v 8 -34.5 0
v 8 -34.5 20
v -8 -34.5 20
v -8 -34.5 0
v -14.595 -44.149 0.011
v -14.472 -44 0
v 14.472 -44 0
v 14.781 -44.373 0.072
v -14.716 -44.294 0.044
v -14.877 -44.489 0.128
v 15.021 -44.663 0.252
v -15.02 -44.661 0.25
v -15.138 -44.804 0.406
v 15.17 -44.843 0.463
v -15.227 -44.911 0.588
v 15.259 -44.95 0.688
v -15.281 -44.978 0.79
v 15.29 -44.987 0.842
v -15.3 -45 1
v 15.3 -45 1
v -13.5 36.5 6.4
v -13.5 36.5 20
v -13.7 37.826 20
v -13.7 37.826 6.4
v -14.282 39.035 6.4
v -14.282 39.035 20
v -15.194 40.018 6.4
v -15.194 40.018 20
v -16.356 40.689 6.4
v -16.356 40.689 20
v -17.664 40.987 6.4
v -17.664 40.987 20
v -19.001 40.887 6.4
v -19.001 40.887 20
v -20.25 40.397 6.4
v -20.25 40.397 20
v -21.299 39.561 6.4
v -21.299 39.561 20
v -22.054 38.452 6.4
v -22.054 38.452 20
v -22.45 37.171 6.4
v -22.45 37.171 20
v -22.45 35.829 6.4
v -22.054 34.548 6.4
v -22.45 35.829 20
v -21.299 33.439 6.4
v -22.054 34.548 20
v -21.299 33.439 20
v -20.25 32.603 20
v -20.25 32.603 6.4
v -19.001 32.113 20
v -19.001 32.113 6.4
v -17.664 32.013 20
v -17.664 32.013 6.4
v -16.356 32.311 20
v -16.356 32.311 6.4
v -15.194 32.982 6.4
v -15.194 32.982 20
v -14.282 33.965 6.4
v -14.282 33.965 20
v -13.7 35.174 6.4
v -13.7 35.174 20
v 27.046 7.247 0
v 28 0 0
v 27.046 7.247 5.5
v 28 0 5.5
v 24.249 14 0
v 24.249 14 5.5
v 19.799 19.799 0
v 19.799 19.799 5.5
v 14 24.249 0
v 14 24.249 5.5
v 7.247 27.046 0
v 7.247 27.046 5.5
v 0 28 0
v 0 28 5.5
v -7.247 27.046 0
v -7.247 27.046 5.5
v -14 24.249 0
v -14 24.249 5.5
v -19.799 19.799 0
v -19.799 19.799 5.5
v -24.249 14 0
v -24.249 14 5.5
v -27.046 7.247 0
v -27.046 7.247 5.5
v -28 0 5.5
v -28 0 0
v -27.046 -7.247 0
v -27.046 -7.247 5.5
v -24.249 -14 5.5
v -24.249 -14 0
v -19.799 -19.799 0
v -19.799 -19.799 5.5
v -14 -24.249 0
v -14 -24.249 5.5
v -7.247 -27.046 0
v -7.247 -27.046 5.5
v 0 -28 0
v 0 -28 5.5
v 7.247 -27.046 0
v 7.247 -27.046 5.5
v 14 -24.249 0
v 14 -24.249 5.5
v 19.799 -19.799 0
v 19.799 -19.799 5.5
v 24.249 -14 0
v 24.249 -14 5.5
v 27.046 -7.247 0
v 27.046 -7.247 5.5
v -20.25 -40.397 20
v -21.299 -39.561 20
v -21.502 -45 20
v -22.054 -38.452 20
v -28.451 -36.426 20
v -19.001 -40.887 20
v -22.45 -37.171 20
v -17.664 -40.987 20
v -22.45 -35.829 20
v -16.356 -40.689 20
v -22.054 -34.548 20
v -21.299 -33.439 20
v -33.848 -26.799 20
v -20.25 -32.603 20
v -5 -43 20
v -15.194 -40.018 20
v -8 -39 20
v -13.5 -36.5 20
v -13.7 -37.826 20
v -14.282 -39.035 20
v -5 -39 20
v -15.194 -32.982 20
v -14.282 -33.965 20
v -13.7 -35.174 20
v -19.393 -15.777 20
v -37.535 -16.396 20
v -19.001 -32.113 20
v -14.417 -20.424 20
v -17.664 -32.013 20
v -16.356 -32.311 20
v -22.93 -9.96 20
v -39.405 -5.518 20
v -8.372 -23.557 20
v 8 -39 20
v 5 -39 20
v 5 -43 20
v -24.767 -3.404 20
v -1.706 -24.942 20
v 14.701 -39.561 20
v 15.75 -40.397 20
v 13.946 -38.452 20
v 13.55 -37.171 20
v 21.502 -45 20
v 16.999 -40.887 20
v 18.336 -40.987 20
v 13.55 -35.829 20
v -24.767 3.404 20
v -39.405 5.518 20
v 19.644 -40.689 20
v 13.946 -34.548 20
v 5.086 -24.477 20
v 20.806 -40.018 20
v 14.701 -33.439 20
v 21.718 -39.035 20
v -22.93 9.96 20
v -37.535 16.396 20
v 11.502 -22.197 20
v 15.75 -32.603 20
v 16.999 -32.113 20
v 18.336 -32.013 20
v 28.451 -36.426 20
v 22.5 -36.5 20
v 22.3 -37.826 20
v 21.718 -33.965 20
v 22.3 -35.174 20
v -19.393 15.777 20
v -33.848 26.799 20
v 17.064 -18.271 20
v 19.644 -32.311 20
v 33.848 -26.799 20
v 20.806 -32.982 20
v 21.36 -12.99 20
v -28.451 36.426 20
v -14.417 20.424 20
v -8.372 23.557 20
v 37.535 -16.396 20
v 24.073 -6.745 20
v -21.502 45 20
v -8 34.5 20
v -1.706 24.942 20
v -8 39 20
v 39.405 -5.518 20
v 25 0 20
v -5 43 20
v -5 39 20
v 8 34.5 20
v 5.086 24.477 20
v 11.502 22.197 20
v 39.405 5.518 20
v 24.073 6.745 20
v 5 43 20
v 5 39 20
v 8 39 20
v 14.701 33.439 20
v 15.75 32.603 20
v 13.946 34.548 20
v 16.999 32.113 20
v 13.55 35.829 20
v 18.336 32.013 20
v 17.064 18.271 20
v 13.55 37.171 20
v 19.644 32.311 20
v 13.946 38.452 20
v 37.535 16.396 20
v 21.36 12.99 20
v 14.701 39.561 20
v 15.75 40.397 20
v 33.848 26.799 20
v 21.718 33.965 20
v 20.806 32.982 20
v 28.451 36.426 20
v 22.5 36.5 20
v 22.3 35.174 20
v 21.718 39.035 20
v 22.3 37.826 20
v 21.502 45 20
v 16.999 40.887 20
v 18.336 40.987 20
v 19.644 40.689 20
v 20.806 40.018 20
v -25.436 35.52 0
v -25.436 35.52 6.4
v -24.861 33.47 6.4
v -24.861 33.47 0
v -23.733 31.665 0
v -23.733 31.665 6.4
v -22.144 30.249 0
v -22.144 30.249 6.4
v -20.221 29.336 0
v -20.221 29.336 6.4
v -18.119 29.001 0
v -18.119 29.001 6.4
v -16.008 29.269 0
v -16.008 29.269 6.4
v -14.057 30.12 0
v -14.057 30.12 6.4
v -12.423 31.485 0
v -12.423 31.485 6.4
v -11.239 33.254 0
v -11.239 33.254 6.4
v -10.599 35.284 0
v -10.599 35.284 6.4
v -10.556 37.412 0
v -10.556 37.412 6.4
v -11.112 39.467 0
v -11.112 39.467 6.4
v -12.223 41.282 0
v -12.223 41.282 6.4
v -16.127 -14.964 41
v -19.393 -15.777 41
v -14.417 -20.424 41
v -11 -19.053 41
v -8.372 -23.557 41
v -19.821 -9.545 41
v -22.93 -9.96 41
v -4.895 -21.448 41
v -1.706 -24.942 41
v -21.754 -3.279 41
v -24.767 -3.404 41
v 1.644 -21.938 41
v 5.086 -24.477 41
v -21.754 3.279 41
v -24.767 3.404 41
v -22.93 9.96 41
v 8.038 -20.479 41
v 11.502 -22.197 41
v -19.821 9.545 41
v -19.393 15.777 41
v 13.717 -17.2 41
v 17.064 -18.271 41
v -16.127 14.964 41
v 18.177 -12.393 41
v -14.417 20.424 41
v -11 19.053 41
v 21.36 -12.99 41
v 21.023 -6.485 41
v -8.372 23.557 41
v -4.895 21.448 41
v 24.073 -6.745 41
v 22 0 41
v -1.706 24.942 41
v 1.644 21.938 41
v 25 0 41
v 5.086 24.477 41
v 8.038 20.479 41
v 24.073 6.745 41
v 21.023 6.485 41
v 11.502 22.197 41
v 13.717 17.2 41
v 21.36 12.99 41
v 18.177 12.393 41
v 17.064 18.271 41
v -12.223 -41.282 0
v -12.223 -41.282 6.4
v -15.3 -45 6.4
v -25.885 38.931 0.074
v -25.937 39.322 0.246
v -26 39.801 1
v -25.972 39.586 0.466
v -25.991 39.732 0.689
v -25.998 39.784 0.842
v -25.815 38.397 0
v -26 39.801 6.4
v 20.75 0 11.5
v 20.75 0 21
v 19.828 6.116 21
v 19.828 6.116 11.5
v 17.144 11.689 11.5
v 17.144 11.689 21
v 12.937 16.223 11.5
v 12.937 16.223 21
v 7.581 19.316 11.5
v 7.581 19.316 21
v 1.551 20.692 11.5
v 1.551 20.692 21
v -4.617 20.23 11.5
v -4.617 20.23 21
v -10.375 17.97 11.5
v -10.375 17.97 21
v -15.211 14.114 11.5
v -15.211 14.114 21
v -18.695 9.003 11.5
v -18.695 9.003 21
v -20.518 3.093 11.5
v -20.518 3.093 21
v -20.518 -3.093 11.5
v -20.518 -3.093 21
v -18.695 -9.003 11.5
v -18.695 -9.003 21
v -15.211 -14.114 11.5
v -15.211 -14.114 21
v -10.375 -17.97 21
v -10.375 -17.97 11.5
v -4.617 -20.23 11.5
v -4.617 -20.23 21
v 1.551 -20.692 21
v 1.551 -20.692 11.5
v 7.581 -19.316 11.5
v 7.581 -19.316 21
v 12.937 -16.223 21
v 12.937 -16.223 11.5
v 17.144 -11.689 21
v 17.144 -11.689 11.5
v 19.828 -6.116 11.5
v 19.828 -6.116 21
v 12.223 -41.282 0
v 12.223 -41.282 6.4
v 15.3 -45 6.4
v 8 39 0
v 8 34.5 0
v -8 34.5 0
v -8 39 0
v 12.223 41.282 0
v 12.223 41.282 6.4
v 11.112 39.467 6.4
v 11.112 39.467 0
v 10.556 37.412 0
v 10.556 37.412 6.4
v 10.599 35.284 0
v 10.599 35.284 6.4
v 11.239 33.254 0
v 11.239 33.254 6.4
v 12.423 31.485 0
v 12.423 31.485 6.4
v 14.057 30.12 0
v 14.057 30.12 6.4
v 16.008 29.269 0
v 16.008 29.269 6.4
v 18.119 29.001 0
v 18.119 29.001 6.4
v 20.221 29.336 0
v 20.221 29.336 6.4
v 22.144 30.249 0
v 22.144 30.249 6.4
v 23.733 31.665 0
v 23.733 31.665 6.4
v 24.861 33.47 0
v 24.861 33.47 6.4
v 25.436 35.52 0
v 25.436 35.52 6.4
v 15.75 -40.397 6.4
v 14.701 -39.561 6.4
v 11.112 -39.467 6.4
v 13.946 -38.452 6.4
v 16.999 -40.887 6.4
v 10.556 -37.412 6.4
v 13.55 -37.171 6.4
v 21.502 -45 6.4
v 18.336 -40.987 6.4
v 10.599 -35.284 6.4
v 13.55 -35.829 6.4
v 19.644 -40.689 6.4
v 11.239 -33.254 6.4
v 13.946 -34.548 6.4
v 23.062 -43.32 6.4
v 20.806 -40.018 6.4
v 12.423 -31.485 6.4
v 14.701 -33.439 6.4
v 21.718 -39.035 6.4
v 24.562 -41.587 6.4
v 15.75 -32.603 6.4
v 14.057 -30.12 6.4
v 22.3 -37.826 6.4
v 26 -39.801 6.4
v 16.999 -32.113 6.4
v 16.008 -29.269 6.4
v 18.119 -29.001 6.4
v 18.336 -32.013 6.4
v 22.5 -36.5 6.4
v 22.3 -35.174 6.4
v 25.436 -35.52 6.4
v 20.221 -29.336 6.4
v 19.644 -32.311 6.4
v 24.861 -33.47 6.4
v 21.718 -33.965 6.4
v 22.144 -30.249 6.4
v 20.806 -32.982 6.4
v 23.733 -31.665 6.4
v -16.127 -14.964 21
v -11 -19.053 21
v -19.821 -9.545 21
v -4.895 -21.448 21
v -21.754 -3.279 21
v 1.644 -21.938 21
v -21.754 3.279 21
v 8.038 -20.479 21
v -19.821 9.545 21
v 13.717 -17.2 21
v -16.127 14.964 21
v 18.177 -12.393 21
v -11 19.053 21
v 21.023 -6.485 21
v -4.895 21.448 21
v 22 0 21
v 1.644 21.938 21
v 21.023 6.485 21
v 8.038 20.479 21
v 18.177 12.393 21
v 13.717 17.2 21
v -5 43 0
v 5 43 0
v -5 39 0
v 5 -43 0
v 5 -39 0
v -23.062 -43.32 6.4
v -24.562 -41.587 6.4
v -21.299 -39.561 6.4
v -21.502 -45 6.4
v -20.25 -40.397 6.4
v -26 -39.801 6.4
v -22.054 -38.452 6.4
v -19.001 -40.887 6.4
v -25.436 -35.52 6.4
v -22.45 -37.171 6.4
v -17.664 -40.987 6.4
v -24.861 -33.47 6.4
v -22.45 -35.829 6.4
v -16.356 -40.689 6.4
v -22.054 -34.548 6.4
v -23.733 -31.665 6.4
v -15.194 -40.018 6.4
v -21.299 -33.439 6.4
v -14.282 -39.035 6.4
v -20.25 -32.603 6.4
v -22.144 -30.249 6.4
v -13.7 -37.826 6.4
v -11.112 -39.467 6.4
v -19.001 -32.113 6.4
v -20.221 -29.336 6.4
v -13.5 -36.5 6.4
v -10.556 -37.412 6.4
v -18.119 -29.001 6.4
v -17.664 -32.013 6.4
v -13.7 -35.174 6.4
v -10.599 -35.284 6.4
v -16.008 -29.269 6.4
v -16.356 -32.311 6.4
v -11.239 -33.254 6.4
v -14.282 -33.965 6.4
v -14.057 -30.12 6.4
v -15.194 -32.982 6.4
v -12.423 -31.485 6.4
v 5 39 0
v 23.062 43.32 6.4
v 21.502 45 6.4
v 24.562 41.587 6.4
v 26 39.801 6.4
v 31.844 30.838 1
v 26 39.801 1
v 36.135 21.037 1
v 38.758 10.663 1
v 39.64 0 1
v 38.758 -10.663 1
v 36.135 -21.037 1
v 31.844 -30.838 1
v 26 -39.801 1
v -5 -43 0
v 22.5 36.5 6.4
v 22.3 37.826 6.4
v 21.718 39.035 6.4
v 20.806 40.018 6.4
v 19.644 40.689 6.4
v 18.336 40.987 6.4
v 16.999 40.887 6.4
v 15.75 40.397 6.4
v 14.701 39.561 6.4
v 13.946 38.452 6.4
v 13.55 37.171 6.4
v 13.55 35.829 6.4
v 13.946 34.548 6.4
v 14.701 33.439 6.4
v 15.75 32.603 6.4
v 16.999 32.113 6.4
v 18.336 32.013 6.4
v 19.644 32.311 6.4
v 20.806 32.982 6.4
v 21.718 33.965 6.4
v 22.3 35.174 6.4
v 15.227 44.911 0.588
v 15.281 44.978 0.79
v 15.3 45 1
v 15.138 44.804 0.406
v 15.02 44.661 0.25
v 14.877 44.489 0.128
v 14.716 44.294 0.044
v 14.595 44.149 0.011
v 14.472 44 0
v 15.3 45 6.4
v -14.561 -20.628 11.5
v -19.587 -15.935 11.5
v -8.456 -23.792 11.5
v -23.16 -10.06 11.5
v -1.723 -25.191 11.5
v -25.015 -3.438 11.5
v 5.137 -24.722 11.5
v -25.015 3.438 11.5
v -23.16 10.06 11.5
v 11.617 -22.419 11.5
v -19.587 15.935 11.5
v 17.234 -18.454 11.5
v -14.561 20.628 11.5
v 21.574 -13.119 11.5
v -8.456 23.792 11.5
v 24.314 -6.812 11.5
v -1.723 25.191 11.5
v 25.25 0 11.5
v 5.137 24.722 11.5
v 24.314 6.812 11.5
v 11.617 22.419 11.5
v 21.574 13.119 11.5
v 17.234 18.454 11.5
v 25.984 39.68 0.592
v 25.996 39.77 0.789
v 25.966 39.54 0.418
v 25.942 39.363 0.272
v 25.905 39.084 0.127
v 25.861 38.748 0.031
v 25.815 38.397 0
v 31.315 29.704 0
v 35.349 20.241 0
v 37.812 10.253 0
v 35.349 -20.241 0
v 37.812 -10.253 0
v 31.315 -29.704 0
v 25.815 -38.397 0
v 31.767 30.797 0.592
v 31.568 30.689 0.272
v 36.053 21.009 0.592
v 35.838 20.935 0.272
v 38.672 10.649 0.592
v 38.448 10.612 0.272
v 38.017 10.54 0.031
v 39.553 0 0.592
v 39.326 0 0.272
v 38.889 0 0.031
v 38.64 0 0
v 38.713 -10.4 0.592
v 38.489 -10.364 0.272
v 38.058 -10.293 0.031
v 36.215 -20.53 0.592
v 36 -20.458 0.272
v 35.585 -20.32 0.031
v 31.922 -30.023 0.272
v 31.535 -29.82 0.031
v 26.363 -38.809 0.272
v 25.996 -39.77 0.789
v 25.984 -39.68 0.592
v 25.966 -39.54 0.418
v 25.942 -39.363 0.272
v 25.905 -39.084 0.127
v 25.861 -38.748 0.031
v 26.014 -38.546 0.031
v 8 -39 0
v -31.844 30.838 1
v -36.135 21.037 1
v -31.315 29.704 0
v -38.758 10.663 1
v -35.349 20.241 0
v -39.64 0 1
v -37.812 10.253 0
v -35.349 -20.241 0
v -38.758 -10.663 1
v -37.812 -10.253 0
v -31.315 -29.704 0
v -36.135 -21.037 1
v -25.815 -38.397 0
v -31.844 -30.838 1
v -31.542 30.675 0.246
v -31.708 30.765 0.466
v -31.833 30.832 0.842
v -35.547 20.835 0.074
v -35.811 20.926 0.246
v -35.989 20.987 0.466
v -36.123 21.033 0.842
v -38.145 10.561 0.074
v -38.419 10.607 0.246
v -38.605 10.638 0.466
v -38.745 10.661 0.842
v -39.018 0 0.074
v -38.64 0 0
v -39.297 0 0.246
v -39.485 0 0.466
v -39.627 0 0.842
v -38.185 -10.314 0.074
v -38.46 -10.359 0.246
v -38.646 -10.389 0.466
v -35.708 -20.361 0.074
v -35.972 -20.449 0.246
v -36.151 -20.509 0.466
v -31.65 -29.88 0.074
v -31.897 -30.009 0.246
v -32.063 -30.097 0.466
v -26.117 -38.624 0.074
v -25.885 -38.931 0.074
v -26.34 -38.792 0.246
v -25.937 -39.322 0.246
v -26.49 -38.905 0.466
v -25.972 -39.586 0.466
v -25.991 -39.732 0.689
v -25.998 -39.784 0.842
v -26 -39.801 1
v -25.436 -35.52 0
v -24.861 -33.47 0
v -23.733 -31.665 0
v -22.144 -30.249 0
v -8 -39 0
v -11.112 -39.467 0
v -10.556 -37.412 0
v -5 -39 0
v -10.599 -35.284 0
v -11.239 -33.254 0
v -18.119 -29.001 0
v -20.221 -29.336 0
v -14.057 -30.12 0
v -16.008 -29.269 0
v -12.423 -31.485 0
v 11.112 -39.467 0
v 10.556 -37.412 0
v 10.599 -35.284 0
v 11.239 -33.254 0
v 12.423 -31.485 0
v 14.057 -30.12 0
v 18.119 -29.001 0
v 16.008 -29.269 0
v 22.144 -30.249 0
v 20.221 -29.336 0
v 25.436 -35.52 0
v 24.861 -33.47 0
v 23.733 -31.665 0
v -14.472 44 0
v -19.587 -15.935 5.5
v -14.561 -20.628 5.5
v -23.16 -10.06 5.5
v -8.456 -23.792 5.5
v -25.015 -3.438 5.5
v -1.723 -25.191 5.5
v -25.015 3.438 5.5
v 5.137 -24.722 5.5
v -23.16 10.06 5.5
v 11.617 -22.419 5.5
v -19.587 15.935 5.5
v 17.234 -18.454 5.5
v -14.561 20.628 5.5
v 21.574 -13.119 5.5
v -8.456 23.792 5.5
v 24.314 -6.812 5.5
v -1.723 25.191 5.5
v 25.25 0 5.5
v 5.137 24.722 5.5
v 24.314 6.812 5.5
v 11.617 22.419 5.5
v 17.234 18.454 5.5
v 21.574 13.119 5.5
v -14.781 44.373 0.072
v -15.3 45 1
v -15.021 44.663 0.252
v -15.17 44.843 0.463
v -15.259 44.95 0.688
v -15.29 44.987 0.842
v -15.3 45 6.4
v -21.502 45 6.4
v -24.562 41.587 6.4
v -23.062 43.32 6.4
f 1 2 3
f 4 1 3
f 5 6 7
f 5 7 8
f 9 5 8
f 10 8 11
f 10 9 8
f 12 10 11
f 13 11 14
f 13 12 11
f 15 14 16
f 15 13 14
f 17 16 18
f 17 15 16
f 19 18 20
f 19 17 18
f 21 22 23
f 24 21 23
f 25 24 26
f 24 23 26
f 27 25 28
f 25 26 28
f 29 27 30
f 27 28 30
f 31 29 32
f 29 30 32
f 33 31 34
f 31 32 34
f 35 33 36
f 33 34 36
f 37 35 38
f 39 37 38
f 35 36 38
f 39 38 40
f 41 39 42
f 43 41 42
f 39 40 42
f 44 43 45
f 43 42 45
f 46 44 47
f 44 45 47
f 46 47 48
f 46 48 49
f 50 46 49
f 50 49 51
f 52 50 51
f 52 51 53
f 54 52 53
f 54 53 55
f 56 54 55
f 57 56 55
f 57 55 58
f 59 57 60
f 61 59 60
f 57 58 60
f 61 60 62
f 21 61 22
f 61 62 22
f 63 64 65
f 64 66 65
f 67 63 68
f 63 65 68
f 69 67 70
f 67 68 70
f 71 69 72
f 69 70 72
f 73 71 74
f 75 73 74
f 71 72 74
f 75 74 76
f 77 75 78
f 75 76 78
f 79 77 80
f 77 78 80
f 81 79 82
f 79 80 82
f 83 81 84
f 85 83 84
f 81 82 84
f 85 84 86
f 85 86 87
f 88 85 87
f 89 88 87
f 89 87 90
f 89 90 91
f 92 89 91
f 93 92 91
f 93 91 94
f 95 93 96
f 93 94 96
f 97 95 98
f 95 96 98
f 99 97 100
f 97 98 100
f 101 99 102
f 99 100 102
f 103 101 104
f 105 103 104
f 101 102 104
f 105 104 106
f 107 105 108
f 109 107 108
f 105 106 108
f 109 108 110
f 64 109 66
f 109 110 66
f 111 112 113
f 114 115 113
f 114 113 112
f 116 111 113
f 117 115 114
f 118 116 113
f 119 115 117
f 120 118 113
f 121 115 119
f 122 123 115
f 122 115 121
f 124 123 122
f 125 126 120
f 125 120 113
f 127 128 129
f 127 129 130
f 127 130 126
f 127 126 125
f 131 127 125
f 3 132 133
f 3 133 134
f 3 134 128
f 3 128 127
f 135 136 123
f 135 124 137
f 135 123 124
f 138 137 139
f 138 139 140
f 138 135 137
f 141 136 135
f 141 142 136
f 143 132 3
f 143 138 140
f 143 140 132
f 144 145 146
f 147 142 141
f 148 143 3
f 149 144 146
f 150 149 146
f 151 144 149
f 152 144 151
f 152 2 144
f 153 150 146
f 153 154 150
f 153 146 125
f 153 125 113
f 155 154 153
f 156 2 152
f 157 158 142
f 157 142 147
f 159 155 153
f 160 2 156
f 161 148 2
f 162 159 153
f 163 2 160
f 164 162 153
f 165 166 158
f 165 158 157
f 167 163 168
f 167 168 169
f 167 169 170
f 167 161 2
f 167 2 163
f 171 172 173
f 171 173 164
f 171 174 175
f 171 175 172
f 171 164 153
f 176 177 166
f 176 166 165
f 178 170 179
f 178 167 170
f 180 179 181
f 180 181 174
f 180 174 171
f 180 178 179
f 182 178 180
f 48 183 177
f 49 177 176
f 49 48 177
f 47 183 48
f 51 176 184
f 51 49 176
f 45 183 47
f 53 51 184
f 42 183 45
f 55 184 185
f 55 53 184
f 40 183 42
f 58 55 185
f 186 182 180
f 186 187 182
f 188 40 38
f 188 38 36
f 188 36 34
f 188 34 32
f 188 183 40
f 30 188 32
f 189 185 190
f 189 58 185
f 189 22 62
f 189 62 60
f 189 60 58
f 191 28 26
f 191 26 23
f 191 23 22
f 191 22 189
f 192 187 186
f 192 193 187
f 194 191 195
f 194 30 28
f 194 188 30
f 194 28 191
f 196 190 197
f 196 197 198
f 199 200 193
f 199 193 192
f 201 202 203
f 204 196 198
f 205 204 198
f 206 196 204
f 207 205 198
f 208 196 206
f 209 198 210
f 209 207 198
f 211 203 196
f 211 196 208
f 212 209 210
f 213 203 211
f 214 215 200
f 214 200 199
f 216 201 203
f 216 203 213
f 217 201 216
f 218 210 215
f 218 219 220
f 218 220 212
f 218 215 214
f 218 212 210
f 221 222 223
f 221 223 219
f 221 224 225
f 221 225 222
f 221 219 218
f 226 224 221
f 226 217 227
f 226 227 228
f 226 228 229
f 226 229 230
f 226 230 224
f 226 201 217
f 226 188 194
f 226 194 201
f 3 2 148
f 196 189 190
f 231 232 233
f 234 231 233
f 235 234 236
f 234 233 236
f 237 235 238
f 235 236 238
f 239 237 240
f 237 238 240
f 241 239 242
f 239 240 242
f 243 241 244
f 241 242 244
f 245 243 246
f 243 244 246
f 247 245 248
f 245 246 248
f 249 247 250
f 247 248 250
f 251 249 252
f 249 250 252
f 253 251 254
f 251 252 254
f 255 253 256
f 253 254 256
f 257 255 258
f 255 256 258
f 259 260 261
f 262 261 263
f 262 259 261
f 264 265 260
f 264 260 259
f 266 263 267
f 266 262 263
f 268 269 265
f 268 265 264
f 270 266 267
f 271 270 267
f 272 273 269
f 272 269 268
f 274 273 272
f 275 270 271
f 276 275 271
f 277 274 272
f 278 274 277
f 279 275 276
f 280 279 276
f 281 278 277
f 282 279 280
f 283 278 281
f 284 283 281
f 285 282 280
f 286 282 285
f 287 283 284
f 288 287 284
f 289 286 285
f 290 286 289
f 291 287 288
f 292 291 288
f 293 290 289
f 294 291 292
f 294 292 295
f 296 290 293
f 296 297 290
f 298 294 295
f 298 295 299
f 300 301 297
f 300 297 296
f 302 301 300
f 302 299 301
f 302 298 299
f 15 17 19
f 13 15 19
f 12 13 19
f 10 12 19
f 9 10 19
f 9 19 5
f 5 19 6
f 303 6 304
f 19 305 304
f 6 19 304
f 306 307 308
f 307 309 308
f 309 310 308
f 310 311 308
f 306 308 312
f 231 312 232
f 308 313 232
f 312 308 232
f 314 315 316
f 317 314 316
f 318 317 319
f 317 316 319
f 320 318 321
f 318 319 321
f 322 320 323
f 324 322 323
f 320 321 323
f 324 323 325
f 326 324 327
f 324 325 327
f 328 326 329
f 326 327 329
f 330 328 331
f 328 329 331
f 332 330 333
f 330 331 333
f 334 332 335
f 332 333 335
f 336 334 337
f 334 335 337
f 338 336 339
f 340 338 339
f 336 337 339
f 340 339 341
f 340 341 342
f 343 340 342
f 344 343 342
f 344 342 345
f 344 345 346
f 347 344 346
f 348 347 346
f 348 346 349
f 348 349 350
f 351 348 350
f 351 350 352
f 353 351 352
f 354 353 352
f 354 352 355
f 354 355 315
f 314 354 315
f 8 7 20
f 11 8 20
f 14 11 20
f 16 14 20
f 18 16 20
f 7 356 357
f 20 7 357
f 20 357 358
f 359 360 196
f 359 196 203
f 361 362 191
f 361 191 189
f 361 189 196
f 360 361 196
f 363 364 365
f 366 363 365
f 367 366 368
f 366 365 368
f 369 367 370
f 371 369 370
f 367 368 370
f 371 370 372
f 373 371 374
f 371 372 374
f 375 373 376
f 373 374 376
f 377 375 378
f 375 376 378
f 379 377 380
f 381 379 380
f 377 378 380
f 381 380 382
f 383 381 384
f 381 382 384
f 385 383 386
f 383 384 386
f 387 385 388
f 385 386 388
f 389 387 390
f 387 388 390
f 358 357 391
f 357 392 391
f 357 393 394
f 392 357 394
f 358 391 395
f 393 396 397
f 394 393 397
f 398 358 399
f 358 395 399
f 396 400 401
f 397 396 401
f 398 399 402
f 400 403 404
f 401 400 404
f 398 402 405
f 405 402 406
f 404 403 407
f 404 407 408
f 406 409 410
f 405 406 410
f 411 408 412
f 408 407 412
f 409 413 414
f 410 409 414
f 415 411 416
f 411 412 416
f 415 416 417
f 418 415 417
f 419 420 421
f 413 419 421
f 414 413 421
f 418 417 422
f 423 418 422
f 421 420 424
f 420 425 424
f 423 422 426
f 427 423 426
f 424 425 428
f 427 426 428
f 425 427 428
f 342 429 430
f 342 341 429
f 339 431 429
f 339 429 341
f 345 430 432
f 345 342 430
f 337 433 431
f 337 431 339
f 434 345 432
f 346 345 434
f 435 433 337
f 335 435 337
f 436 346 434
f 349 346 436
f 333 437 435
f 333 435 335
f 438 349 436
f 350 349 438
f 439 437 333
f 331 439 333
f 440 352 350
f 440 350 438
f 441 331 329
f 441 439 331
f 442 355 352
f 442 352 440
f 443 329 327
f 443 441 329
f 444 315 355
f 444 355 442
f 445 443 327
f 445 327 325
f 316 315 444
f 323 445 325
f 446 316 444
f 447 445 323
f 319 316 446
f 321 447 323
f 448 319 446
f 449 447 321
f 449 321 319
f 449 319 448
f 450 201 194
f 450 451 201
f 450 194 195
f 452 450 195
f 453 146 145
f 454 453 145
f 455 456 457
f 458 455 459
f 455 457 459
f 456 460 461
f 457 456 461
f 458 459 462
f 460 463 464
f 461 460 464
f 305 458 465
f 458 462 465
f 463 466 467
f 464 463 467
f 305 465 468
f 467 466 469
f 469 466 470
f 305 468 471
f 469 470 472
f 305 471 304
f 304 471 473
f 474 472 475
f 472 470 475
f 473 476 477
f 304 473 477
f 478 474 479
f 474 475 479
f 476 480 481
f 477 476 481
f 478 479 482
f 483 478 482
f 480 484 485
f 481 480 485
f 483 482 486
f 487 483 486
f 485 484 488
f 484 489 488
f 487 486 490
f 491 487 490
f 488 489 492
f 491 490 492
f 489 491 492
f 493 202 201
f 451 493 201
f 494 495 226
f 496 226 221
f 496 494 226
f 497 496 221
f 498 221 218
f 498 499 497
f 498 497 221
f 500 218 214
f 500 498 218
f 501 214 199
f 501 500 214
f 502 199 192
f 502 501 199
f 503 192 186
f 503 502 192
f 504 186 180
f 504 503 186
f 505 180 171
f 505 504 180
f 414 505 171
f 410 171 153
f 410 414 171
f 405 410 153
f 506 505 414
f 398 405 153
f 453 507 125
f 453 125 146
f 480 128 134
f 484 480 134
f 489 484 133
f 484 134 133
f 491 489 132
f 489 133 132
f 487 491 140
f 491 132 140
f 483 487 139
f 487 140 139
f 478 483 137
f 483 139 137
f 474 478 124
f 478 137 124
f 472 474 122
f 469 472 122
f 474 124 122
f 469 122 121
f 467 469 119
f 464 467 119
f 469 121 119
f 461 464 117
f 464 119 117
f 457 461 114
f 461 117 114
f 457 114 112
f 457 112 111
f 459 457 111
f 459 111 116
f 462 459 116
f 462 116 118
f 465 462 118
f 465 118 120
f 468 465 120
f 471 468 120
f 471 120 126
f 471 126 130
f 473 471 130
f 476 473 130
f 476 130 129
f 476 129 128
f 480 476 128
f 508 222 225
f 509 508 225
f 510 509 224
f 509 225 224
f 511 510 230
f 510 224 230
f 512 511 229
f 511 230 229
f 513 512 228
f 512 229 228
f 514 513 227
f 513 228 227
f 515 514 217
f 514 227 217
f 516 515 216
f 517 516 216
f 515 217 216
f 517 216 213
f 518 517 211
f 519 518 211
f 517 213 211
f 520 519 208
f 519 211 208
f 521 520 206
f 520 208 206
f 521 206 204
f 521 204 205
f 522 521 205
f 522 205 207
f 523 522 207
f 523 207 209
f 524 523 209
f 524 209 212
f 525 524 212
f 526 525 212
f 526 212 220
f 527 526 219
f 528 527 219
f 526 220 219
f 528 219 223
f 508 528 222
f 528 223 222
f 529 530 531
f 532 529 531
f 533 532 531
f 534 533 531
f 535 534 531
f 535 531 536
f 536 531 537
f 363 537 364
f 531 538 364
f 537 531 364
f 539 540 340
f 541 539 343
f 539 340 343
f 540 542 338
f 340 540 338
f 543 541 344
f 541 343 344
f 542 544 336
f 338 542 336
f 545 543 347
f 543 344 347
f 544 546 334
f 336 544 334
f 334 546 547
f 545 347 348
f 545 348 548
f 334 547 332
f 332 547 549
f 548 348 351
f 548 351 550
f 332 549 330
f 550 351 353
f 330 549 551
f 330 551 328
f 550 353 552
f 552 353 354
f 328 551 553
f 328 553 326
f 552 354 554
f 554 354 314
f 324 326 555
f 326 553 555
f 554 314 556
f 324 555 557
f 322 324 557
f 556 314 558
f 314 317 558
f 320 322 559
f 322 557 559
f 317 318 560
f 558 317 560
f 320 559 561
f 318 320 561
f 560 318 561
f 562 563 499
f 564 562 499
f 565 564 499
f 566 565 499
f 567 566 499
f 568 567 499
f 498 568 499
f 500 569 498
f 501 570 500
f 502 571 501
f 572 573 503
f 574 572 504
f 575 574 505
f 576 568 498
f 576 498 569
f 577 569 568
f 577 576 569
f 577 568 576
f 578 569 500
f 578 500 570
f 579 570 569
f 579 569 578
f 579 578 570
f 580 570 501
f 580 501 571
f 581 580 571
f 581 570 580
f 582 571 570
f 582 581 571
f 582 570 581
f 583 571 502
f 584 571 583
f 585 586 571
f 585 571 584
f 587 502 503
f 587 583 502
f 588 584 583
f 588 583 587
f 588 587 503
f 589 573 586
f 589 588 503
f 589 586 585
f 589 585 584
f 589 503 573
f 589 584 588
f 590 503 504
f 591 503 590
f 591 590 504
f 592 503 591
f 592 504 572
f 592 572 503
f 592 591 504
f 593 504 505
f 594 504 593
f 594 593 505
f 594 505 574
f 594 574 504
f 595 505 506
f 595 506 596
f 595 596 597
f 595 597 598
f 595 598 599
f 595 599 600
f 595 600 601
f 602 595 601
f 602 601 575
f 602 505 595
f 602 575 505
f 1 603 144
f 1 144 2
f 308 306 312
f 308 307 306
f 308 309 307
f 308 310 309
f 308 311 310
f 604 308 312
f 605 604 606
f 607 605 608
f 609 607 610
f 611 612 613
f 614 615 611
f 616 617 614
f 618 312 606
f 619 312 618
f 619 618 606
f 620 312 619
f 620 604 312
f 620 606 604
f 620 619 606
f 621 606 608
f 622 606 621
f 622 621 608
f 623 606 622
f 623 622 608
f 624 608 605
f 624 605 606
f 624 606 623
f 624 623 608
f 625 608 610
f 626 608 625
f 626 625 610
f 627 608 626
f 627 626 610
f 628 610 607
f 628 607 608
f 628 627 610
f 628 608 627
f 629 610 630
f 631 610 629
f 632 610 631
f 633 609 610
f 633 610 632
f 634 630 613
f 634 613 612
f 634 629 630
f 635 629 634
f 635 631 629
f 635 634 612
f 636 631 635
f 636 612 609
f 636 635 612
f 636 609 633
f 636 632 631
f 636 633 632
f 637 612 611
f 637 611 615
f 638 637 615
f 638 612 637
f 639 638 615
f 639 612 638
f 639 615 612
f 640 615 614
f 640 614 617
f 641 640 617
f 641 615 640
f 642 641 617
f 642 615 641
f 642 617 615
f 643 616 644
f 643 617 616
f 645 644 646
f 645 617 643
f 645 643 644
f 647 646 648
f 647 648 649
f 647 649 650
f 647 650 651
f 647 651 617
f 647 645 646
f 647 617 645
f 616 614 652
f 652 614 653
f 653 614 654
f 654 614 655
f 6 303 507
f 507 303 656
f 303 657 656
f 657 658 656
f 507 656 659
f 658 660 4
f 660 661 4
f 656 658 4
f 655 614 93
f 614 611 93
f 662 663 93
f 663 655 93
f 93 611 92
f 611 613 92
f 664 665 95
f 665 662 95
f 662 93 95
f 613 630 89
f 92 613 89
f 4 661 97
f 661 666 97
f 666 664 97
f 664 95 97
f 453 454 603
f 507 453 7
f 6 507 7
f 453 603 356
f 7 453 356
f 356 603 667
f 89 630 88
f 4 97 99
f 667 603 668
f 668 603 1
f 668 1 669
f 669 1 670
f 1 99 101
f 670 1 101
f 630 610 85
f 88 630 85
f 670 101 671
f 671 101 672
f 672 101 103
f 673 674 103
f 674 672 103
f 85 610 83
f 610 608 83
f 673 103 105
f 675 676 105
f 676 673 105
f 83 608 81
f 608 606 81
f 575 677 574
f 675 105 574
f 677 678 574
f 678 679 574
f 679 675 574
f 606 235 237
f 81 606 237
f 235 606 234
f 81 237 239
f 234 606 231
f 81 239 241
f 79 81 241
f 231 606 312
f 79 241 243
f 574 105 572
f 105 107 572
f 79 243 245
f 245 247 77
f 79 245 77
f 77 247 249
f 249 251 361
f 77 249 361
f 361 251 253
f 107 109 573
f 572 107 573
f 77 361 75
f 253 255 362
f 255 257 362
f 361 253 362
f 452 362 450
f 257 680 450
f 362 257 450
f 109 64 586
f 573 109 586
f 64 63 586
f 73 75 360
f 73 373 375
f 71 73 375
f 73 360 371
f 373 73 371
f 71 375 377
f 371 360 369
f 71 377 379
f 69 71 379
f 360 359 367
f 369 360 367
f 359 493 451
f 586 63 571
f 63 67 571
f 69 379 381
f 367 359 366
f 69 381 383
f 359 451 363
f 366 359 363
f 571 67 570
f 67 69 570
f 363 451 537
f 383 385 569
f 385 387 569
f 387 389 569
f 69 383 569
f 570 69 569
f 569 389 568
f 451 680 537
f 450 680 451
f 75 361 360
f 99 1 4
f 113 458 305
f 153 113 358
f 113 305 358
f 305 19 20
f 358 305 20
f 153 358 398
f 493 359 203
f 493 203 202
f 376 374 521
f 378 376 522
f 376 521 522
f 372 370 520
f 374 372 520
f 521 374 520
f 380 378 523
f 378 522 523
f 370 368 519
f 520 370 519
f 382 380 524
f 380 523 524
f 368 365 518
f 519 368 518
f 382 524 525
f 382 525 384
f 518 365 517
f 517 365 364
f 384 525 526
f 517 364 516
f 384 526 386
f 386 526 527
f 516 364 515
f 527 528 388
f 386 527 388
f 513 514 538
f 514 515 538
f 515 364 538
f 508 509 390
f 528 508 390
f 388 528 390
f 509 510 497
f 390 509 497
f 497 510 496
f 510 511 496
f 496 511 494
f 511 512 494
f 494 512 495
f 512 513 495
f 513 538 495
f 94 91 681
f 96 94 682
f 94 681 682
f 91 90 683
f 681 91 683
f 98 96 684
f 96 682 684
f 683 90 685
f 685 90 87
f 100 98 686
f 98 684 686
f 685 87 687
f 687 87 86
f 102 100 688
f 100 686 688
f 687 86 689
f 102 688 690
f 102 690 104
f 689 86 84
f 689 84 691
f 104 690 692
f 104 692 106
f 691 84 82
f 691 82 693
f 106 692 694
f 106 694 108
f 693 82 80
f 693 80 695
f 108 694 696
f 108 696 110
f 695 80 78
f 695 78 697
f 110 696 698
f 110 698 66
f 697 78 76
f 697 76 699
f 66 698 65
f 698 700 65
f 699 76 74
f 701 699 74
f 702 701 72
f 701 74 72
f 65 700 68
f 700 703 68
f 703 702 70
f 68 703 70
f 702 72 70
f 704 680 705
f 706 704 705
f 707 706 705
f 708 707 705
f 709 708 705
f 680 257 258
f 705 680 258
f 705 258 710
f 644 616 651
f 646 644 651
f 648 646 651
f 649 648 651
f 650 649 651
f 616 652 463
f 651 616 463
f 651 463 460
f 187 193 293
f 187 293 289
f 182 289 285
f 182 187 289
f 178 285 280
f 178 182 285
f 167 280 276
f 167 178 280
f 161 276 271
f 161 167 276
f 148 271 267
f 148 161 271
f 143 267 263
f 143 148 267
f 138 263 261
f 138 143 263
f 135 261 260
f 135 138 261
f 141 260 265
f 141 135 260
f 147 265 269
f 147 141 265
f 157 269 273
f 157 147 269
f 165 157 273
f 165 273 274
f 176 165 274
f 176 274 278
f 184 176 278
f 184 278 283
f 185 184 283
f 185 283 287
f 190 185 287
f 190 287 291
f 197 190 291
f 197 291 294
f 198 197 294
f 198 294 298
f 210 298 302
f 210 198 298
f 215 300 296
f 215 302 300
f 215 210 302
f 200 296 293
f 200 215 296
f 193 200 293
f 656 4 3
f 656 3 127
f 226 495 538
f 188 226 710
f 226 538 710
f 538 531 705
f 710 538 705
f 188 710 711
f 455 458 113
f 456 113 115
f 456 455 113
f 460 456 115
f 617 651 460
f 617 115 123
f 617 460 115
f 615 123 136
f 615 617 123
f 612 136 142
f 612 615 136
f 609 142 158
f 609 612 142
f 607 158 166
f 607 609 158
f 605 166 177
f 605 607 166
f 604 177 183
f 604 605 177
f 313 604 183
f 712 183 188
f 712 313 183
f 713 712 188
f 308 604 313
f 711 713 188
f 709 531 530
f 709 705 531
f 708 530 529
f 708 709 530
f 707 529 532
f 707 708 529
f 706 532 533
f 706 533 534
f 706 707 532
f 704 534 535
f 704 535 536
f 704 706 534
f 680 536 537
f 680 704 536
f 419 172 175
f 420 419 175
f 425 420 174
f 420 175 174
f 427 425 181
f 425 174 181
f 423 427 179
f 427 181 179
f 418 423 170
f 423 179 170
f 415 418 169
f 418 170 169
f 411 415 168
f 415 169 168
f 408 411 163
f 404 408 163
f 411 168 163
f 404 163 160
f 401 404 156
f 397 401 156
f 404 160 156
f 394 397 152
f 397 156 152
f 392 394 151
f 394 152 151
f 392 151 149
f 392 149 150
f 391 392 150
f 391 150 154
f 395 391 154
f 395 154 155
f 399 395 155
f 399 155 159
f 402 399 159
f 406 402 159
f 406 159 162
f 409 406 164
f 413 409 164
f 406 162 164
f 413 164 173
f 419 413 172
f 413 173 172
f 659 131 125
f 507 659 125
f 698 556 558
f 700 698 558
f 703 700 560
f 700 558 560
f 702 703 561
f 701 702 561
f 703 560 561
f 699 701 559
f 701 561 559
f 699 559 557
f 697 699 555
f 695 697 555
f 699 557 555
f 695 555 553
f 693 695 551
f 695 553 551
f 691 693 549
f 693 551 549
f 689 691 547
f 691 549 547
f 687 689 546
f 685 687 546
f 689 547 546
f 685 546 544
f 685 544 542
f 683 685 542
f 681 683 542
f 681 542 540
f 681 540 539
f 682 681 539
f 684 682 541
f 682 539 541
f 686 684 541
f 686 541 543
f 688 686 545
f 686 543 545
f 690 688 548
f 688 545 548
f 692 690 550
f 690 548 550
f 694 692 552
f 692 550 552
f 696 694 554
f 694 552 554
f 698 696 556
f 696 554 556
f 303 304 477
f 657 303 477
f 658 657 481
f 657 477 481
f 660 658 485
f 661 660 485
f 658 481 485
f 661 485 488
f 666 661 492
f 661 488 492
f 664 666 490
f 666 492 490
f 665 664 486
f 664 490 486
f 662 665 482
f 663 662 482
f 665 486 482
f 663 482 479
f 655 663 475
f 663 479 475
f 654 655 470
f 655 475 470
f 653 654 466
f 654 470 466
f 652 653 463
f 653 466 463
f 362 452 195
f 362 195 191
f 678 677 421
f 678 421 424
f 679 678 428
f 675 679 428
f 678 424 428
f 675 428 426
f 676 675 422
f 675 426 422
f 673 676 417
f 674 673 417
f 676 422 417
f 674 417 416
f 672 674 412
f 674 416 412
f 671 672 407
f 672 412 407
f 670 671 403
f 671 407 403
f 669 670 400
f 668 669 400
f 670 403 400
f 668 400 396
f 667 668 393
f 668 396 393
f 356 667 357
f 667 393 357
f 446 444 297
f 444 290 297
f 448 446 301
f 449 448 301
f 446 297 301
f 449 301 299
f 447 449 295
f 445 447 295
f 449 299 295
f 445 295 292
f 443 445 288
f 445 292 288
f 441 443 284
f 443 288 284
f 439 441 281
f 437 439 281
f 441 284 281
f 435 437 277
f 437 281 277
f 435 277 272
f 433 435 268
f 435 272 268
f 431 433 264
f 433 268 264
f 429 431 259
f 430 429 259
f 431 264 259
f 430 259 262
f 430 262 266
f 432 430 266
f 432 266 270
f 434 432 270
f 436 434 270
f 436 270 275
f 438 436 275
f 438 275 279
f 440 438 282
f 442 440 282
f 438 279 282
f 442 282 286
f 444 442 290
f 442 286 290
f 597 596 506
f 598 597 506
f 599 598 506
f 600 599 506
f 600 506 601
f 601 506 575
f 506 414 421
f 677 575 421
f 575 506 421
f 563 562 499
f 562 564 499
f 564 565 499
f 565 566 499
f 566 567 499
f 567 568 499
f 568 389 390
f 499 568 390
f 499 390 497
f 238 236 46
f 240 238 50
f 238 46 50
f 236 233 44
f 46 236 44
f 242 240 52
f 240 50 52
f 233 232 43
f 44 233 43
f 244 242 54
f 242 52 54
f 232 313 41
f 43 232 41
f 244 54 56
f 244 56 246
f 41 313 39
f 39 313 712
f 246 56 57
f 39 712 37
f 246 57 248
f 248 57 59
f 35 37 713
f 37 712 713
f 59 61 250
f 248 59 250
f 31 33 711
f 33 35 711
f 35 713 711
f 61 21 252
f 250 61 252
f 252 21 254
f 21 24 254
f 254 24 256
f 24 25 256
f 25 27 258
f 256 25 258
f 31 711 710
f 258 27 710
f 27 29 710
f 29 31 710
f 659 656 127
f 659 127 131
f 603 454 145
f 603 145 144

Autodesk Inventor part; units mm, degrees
sketch "Skizze_1" plane through (0, 0, 0) normal (0, 0, 1) x (1, 0, 0)
  arc A0 (-21.5016, 45) -> (-21.5016, -45) centre (25.25, 0) ccw
  line L0 (-21.5016, -45) -> (21.5016, -45)
  arc A1 (21.5016, -45) -> (21.5016, 45) centre (-25.25, 0) ccw
  line L1 (21.5016, 45) -> (-21.5016, 45)
extrude "Extrusion1" add sketch "Skizze_1" along normal blind 20
sketch "Skizze_2" plane through (0, 0, 0) normal (0, 1, 0) x (-1, 0, 0)
  line L0 (-25.25, -50) -> (-25.25, 50)
  line L1 (40.14, -0.5) -> (40.14, 1)
  line L2 (40.14, 1) -> (39.64, 1)
  arc A0 (38.64, 0) -> (39.64, 1) centre (38.64, 1) ccw
  line L3 (38.64, 0) -> (38.64, -0.5)
  line L4 (38.64, -0.5) -> (40.14, -0.5)
revolve "Revolution1" cut sketch "Skizze_2" angle 360 about axis through (25.25, 0, -50) along (0, 0, -1)
sketch "Skizze_3" plane through (0, 0, 0) normal (0, 1, 0) x (-1, 0, 0)
  line L0 (25.25, 50) -> (25.25, -50)
  arc A0 (-39.64, 1) -> (-38.64, 0) centre (-38.64, 1) ccw
  line L1 (-39.64, 1) -> (-40.14, 1)
  line L2 (-40.14, 1) -> (-40.14, -0.5)
  line L3 (-40.14, -0.5) -> (-38.64, -0.5)
  line L4 (-38.64, -0.5) -> (-38.64, 0)
revolve "Revolution2" cut sketch "Skizze_3" angle 360 about axis through (-25.25, 0, 50) along (0, 0, 1)
sketch "Skizze_4" plane through (0, 0, 0) normal (1, 0, 0) x (0, 1, 0)
  arc A0 (44, 0) -> (45, 1) centre (44, 1) ccw
  line L0 (44, 0) -> (45, 0)
  line L1 (45, 0) -> (45, 1)
extrude "Extrusion2" cut sketch "Skizze_4" along normal mid plane 90
sketch "Skizze_5" plane through (0, 0, 0) normal (1, 0, 0) x (0, 1, 0)
  line L0 (-45, 1) -> (-45, 0)
  line L1 (-45, 0) -> (-44, 0)
  arc A0 (-45, 1) -> (-44, 0) centre (-44, 1) ccw
extrude "Extrusion3" cut sketch "Skizze_5" along normal mid plane 90
sketch "Skizze_6" plane through (0, 0, 0) normal (0, 0, 1) x (1, 0, 0)
  circle A0 centre (0, 0) radius 25
extrude "Extrusion4" add sketch "Skizze_6" along normal blind 41
sketch "Skizze_7" plane through (0, 0, 0) normal (0, 1, 0) x (-1, 0, 0)
  line L0 (0, 41) -> (0, 0)
  line L1 (0, 0) -> (-28, 0)
  line L2 (-28, 0) -> (-28, 5.5)
  line L3 (-28, 5.5) -> (-25.25, 5.5)
  line L4 (-25.25, 5.5) -> (-25.25, 11.5)
  line L5 (-25.25, 11.5) -> (-20.75, 11.5)
  line L6 (-20.75, 11.5) -> (-20.75, 21)
  line L7 (-20.75, 21) -> (-22, 21)
  line L8 (-22, 21) -> (-22, 41)
  line L9 (-22, 41) -> (0, 41)
  line L10 (0, 41) -> (0, 0)
revolve "Revolution3" cut sketch "Skizze_7" angle 360 about axis through (0, 0, 41) along (0, 0, 1)
sketch "Skizze_8" plane through (0, 0, 0) normal (0, 0, 1) x (1, 0, 0)
  line L0 (-8, 39) -> (-8, 34.5)
  line L1 (-8, 34.5) -> (8, 34.5)
  line L2 (8, 34.5) -> (8, 39)
  line L3 (8, 39) -> (5, 39)
  line L4 (5, 39) -> (5, 43)
  line L5 (5, 43) -> (-5, 43)
  line L6 (-5, 43) -> (-5, 39)
  line L7 (-5, 39) -> (-8, 39)
extrude "Extrusion5" cut sketch "Skizze_8" along normal blind 20
sketch "Skizze_9" plane through (0, 0, 0) normal (0, 0, 1) x (1, 0, 0)
  line L0 (-8, -34.5) -> (-8, -39)
  line L1 (-8, -39) -> (-5, -39)
  line L2 (-5, -39) -> (-5, -43)
  line L3 (-5, -43) -> (5, -43)
  line L4 (5, -43) -> (5, -39)
  line L5 (5, -39) -> (8, -39)
  line L6 (8, -39) -> (8, -34.5)
  line L7 (8, -34.5) -> (-8, -34.5)
extrude "Extrusion6" cut sketch "Skizze_9" along normal blind 20
sketch "Skizze_10" plane through (0, 0, 6.4) normal (0, 0, 1) x (1, 0, 0)
  circle A0 centre (18, 36.5) radius 4.5
extrude "Extrusion7" cut sketch "Skizze_10" along normal mid plane 40
pattern_linear "Rectangular Pattern1" count 2 spacing 36 along (-1, 0, 0) count 2 spacing 73 along (0, -1, 0) of "Extrusion7"
sketch "Skizze_12" plane through (0, 0, 6.4) normal (0, 0, 1) x (1, 0, 0)
  arc A0 (12.2226, 41.2825) -> (25.4357, 35.5199) centre (18, 36.5) ccw
  line L0 (25.4357, 35.5199) -> (26, 39.8014)
  arc A1 (26, 39.8014) -> (21.5016, 45) centre (-25.25, 0) ccw
  line L1 (21.5016, 45) -> (15.3, 45)
  line L2 (15.3, 45) -> (12.2226, 41.2825)
extrude "Extrusion8" cut sketch "Skizze_12" against normal blind 6.4
sketch "Skizze_13" plane through (0, 0, 6.4) normal (0, 0, 1) x (1, 0, 0)
  line L0 (-26, 39.8014) -> (-25.4357, 35.5199)
  arc A0 (-25.4357, 35.5199) -> (-12.2226, 41.2825) centre (-18, 36.5) ccw
  line L1 (-12.2226, 41.2825) -> (-15.3, 45)
  line L2 (-15.3, 45) -> (-21.5016, 45)
  arc A1 (-21.5016, 45) -> (-26, 39.8014) centre (25.25, 0) ccw
extrude "Extrusion9" cut sketch "Skizze_13" against normal blind 6.4
sketch "Skizze_14" plane through (0, 0, 6.4) normal (0, 0, 1) x (1, 0, 0)
  arc A0 (25.4357, -35.5199) -> (12.2226, -41.2825) centre (18, -36.5) ccw
  line L0 (12.2226, -41.2825) -> (15.3, -45)
  line L1 (15.3, -45) -> (21.5016, -45)
  arc A1 (21.5016, -45) -> (26, -39.8014) centre (-25.25, 0) ccw
  line L2 (26, -39.8014) -> (25.4357, -35.5199)
extrude "Extrusion10" cut sketch "Skizze_14" against normal blind 6.4
sketch "Skizze_15" plane through (0, 0, 6.4) normal (0, 0, 1) x (1, 0, 0)
  arc A0 (-26, -39.8014) -> (-21.5016, -45) centre (25.25, 0) ccw
  line L0 (-21.5016, -45) -> (-15.3, -45)
  line L1 (-15.3, -45) -> (-12.2226, -41.2825)
  arc A1 (-12.2226, -41.2825) -> (-25.4357, -35.5199) centre (-18, -36.5) ccw
  line L2 (-25.4357, -35.5199) -> (-26, -39.8014)
extrude "Extrusion11" cut sketch "Skizze_15" against normal blind 6.4
ref_plane "EPANDOPPRO_XY" through (0, 0, 20) normal (0, 0, 1) x (1, 0, 0)
ref_plane "EPANDOPPRO_YZ" through (0, 0, 20) normal (1, 0, 0) x (0, 1, 0)
ref_plane "EPANDOPPRO_ZX" through (0, 0, 20) normal (0, 1, 0) x (0, 0, 1)
ref_plane "EPDICHTR_XY" through (0, 0, 5.5) normal (0, 0, 1) x (1, 0, 0)
ref_plane "EPDICHTR_YZ" through (0, 0, 5.5) normal (1, 0, 0) x (0, 1, 0)
ref_plane "EPDICHTR_ZX" through (0, 0, 5.5) normal (0, 1, 0) x (0, 0, 1)
ref_plane "EPZYL_XY" through (18, 36.5, 6.4) normal (0, 0, 1) x (1, 0, 0)
ref_plane "EPZYL_YZ" through (18, 36.5, 6.4) normal (1, 0, 0) x (0, 1, 0)
ref_plane "EPZYL_ZX" through (18, 36.5, 6.4) normal (0, 1, 0) x (0, 0, 1)
ref_plane "EPZYL2_XY" through (-18, 36.5, 6.4) normal (0, 0, 1) x (1, 0, 0)
ref_plane "EPZYL2_YZ" through (-18, 36.5, 6.4) normal (1, 0, 0) x (0, 1, 0)
ref_plane "EPZYL2_ZX" through (-18, 36.5, 6.4) normal (0, 1, 0) x (0, 0, 1)
ref_plane "EPZYL3_XY" through (-18, -36.5, 6.4) normal (0, 0, 1) x (1, 0, 0)
ref_plane "EPZYL3_YZ" through (-18, -36.5, 6.4) normal (1, 0, 0) x (0, 1, 0)
ref_plane "EPZYL3_ZX" through (-18, -36.5, 6.4) normal (0, 1, 0) x (0, 0, 1)
ref_plane "EPZYL4_XY" through (18, -36.5, 6.4) normal (0, 0, 1) x (1, 0, 0)
ref_plane "EPZYL4_YZ" through (18, -36.5, 6.4) normal (1, 0, 0) x (0, 1, 0)
ref_plane "EPZYL4_ZX" through (18, -36.5, 6.4) normal (0, 1, 0) x (0, 0, 1)
properties part number "Abdeckkappe_LZ80"
